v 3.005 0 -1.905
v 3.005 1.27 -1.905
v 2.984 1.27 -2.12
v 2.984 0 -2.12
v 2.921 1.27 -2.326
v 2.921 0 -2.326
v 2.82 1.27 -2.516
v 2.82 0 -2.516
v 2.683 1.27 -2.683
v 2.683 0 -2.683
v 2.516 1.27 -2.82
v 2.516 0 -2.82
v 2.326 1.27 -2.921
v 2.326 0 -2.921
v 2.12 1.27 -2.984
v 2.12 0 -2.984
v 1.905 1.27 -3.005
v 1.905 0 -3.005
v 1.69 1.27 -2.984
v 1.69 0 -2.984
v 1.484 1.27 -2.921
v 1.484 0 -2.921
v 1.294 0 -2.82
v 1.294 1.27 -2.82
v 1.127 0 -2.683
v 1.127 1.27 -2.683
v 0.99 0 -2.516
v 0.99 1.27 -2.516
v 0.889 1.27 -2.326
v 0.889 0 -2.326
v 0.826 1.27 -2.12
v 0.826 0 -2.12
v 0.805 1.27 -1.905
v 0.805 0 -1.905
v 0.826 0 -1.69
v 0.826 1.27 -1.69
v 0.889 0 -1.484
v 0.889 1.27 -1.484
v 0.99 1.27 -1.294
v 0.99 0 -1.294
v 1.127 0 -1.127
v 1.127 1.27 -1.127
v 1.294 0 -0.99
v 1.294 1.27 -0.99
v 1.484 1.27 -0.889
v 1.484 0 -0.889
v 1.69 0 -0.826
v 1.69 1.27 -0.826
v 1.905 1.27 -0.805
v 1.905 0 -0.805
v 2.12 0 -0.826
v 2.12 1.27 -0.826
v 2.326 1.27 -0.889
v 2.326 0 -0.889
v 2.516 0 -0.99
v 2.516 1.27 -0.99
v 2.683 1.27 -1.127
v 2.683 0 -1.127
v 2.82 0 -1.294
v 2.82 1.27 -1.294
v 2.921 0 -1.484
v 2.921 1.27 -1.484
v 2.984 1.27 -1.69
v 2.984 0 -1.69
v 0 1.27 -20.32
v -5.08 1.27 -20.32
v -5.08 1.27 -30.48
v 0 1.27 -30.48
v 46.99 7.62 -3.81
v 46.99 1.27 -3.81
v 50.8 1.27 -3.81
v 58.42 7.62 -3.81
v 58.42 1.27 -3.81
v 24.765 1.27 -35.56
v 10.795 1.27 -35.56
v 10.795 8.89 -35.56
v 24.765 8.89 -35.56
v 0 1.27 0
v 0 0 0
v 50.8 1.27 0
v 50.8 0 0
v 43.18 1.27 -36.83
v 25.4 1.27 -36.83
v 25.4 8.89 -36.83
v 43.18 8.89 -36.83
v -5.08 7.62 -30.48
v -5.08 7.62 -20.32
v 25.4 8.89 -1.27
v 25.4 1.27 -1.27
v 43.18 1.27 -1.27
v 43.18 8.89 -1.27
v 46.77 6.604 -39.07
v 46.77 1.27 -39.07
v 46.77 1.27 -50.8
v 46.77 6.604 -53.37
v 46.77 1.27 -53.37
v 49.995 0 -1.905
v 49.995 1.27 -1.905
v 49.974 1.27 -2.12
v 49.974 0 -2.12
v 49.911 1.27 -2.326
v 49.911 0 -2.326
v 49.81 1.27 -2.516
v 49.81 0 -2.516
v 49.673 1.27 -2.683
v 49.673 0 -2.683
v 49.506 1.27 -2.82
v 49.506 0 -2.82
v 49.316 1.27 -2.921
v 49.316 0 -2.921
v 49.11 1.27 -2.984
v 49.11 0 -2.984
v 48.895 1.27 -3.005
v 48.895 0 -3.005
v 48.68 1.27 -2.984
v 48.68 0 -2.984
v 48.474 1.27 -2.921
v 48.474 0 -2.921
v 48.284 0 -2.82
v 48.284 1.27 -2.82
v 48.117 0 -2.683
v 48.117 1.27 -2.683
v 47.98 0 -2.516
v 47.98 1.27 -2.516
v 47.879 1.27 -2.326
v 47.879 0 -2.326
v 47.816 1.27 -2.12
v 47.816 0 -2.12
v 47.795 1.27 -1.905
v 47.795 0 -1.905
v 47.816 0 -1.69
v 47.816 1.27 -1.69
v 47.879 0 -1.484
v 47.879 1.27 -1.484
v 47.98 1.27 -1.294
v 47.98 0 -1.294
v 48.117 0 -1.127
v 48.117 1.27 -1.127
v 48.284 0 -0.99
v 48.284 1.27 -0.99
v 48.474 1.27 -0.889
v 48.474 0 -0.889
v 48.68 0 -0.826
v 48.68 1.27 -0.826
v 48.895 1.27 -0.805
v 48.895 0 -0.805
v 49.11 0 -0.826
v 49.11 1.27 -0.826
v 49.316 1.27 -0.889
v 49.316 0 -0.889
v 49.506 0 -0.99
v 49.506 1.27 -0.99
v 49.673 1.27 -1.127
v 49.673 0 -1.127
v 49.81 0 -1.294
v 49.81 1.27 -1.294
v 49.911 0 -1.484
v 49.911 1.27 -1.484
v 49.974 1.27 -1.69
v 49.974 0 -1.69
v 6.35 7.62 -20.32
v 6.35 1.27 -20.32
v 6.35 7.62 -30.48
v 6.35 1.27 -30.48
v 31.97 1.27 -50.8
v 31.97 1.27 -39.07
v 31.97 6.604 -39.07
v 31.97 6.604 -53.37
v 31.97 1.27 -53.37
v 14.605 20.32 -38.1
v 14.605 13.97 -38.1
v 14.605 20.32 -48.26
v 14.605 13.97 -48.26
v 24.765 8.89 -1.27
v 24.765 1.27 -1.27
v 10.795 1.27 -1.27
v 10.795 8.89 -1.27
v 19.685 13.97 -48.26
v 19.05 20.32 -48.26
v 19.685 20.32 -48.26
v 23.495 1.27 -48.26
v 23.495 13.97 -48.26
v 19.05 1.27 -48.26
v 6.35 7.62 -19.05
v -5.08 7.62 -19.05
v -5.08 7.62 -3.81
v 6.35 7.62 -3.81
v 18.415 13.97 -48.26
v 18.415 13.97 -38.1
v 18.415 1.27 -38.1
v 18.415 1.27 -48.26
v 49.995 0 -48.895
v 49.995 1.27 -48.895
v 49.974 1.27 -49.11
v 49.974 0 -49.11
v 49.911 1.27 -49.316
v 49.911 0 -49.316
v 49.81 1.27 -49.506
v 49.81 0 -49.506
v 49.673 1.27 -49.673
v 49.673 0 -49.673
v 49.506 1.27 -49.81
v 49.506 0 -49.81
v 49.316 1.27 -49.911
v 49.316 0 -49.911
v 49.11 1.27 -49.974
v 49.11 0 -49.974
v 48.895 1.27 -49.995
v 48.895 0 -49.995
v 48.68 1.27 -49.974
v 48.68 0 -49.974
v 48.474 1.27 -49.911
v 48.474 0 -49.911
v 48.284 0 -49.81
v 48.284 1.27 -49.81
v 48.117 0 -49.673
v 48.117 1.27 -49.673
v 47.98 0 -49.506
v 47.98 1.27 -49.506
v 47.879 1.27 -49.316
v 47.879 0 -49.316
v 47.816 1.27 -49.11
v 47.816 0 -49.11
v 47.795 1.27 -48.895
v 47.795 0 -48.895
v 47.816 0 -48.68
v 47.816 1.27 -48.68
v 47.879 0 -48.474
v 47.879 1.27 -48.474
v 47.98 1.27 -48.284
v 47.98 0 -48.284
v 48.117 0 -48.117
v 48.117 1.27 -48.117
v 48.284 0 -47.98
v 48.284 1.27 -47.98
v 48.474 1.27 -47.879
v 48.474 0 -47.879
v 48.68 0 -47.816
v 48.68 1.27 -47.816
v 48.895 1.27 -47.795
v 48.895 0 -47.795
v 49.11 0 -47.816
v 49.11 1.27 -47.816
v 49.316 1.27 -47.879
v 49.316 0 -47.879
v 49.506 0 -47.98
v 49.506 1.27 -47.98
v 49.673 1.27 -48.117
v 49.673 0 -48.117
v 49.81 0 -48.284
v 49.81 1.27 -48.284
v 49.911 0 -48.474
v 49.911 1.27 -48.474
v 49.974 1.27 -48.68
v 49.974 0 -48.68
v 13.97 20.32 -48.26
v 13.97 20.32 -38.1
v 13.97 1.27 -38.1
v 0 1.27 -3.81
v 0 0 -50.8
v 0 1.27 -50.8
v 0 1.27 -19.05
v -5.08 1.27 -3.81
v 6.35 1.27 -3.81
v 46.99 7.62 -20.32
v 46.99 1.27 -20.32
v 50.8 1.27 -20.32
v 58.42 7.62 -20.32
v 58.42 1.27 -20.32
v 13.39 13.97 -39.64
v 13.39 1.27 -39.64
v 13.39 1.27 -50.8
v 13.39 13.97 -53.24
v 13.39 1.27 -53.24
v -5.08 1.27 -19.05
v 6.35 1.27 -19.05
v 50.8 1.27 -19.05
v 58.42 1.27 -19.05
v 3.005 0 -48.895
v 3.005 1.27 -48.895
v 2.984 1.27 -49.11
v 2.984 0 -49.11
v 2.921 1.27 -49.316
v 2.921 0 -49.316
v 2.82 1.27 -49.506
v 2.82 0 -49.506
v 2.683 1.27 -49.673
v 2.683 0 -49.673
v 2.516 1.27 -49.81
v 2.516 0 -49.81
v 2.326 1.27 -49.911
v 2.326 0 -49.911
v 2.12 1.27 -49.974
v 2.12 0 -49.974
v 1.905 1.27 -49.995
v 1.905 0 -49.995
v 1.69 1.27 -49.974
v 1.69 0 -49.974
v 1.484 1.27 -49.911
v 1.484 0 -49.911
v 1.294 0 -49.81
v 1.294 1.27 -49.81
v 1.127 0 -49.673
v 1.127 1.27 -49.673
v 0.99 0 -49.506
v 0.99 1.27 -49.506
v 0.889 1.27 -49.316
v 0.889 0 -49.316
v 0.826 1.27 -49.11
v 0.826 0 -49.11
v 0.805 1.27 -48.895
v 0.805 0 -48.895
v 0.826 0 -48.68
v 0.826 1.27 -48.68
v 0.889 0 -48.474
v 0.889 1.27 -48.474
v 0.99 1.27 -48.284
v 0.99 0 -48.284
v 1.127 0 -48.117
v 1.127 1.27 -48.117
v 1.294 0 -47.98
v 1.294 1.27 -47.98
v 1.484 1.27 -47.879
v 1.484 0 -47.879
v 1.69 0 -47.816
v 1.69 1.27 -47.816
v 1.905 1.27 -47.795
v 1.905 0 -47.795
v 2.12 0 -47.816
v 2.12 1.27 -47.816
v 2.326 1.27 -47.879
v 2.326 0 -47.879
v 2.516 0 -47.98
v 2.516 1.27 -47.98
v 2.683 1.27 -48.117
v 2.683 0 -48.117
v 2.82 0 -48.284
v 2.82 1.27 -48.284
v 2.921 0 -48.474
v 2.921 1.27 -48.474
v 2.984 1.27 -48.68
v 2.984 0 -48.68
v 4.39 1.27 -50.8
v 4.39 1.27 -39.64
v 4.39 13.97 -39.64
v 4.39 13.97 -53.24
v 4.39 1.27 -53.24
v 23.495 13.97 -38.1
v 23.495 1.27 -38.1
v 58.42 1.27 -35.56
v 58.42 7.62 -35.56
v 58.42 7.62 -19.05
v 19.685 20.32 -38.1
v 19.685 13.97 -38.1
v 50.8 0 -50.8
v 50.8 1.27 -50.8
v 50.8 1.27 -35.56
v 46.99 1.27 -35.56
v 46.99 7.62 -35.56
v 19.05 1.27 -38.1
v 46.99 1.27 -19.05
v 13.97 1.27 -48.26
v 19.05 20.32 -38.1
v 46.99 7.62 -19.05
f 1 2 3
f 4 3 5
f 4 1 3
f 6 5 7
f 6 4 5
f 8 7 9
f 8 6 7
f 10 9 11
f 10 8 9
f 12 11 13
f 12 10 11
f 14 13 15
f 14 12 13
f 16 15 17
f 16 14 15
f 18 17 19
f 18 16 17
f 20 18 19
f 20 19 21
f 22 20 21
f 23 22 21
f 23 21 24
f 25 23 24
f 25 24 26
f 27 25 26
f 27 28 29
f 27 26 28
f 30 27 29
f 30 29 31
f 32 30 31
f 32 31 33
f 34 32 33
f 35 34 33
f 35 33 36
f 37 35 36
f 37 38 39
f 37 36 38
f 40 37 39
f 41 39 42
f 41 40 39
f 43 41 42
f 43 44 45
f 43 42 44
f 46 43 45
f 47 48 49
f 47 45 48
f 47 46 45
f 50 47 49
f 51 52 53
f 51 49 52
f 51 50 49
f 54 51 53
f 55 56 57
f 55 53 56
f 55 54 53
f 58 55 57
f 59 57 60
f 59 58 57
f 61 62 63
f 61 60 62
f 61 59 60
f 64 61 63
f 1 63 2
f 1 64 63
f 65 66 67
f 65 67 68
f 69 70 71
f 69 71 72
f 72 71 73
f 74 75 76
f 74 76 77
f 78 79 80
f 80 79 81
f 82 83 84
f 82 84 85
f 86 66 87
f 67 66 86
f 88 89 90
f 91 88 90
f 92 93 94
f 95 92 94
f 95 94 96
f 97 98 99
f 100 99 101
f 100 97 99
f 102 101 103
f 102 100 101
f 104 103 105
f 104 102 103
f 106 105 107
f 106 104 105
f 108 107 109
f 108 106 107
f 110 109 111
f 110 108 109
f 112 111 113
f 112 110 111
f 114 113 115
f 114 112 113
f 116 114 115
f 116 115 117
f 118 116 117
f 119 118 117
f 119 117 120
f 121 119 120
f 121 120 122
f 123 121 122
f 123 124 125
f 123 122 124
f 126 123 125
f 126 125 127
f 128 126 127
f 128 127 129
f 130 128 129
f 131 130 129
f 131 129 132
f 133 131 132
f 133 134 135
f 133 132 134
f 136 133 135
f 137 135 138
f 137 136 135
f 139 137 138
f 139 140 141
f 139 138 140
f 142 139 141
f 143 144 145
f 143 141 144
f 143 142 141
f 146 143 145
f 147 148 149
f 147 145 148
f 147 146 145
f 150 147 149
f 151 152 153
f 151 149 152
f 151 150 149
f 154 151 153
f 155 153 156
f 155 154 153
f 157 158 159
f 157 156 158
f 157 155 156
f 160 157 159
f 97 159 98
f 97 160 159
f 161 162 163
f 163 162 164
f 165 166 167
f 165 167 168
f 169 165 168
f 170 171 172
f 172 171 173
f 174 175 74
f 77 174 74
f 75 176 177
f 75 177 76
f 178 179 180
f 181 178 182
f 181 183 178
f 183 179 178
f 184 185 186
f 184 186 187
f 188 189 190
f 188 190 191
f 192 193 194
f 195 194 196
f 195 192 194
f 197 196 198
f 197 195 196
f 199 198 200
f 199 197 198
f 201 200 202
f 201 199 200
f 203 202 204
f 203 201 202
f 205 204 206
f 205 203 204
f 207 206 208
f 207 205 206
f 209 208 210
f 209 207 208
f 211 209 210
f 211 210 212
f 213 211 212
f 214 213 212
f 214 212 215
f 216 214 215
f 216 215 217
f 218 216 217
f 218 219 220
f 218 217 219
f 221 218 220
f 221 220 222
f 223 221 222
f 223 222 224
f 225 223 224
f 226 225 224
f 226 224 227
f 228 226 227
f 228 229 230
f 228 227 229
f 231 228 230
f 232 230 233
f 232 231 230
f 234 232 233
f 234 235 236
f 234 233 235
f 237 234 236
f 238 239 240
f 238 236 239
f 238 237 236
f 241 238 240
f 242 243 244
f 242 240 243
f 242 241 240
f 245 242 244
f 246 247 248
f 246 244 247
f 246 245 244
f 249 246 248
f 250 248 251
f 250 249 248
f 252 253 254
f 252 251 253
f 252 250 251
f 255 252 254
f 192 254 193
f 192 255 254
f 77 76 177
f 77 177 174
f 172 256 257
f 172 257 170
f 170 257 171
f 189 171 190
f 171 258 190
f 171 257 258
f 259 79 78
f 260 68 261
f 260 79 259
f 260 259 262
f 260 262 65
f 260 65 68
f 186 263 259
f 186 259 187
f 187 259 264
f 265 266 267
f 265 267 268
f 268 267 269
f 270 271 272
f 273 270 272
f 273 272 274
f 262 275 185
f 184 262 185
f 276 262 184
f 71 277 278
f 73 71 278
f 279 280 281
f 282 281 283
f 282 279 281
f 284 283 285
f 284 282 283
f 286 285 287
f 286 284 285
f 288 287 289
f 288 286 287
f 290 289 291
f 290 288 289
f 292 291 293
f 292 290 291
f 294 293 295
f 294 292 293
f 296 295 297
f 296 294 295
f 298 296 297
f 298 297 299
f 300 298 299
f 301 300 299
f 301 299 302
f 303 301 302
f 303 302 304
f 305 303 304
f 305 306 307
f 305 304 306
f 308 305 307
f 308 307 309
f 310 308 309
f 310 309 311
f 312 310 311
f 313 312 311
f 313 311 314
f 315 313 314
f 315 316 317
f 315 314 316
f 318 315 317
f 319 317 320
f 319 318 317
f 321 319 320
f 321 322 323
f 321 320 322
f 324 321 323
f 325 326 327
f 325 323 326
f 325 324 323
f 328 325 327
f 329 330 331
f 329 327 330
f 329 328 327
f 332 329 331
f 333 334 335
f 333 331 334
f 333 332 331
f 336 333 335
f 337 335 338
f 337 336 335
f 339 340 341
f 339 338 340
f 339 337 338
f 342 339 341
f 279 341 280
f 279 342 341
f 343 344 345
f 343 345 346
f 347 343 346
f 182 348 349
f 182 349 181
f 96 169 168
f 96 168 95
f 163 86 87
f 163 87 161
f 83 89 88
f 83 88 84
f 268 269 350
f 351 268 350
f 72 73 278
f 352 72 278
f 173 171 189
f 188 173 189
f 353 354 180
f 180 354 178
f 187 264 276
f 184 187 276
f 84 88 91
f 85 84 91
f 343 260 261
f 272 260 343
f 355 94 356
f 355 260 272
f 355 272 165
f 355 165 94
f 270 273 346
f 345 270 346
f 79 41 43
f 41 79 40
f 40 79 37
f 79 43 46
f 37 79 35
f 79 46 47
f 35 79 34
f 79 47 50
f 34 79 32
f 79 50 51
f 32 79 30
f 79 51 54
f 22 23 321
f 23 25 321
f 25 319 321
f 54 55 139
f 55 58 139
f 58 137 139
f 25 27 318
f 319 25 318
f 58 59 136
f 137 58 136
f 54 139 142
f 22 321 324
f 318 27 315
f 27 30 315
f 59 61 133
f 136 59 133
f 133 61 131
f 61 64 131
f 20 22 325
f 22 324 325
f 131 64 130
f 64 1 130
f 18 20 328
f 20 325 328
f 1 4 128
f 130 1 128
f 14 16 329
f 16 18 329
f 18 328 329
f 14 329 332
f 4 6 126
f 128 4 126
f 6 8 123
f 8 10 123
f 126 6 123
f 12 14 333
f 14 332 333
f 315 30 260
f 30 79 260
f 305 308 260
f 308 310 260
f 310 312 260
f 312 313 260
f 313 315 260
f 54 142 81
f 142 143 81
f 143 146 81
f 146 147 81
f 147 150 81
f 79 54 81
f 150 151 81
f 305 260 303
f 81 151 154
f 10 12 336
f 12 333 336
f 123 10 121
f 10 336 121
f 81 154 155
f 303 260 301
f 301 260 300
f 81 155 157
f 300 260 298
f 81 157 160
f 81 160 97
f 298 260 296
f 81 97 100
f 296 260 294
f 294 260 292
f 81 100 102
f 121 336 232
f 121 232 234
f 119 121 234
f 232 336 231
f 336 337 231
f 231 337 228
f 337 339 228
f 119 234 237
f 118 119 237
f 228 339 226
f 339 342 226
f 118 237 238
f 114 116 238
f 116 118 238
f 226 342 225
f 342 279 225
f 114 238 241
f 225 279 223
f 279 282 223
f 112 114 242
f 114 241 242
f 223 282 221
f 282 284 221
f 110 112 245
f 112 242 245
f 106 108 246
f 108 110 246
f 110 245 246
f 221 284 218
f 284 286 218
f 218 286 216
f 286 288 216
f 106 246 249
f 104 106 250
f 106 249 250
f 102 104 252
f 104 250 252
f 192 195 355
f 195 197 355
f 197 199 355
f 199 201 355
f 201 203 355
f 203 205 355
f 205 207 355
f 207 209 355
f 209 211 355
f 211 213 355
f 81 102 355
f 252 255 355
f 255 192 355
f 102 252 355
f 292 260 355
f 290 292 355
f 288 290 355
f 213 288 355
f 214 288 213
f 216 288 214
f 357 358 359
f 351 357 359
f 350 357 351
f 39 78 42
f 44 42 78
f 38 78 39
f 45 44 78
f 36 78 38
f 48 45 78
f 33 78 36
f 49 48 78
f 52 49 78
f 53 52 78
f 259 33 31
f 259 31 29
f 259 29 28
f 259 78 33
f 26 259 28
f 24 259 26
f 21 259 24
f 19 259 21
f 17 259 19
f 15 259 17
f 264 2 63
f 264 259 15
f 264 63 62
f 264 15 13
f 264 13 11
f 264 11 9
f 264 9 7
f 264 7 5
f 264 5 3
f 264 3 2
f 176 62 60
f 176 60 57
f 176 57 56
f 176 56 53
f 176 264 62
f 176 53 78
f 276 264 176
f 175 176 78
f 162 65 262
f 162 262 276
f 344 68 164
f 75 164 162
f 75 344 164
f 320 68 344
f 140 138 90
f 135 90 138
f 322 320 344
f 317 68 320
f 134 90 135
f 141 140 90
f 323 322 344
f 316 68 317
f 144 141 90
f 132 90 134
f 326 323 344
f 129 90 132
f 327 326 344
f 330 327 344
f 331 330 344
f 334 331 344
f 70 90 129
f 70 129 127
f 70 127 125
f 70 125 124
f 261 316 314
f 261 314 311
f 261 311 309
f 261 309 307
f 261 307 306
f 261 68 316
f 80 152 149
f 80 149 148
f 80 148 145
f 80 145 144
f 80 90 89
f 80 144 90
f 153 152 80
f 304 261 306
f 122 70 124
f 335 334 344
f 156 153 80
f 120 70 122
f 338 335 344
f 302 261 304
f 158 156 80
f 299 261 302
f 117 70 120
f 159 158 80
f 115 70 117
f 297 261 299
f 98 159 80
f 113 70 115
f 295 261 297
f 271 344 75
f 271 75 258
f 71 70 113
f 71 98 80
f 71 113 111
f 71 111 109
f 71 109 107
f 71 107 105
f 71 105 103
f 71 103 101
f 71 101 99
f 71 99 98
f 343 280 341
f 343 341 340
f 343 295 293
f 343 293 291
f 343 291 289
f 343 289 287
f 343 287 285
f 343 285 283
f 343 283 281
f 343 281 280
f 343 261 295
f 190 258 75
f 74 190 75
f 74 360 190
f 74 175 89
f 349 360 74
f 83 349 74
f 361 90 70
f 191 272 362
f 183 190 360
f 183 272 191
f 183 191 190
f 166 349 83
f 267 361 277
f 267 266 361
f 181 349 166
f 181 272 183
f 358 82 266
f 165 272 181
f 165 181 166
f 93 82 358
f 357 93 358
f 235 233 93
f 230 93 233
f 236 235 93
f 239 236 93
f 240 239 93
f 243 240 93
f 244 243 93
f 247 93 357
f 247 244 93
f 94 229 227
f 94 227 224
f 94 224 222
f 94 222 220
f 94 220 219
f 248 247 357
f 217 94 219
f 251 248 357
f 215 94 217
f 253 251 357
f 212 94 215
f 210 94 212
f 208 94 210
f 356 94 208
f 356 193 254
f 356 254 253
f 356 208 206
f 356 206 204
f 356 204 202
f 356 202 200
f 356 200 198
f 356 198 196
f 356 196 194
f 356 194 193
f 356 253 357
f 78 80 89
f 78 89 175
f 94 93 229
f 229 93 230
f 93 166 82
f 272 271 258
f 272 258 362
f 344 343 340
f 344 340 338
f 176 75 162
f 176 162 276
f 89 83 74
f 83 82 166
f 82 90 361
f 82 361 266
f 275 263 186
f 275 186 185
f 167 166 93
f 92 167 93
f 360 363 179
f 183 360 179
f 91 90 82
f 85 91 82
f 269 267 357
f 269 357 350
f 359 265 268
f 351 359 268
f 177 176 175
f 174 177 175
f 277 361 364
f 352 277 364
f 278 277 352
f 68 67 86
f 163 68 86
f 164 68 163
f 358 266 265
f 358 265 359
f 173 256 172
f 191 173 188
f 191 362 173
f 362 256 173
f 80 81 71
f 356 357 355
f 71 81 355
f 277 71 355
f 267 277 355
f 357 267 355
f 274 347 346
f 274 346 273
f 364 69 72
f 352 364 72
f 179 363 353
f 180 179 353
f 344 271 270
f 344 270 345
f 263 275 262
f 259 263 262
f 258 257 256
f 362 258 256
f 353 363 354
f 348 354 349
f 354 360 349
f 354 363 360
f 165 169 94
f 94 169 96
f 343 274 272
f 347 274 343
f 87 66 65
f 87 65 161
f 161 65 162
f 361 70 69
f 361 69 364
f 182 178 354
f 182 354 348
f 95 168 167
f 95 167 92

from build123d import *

# Parameters (mm, degrees)
SKETCH3_W           = 50.8
SKETCH3_H           = 50.8
BOSS_EXTRUDE1_DEPTH = 1.27
CUT_EXTRUDE1_REACH  = 3.27
SKETCH4_R           = 1.0999978
SKETCH5_W           = 17.78
SKETCH5_H           = 35.56
SKETCH5_W_2         = 13.97
SKETCH5_H_2         = 34.29
BOSS_EXTRUDE2_DEPTH = 7.62
SKETCH6_W           = 14.8000212
SKETCH6_H           = 14.2999968
BOSS_EXTRUDE3_DEPTH = 5.334
BOSS_EXTRUDE4_DEPTH = 12.7
SKETCH8_W           = 11.43
SKETCH8_H           = 15.24
SKETCH8_H_2         = 10.16
BOSS_EXTRUDE5_DEPTH = 6.35
SKETCH9_W           = 3.81
SKETCH9_H           = 10.16
BOSS_EXTRUDE6_DEPTH = 12.7
SKETCH10_W          = 0.635
SKETCH10_H          = 10.16
BOSS_EXTRUDE7_DEPTH = 19.05


with BuildPart() as part:
    # Sketch3 → Boss-Extrude1 (new body)
    with BuildSketch(Plane(origin=(0, 0, 0), x_dir=(1, 0, 0), z_dir=(0, 1, 0))):
        with Locations((25.4, 25.4)):
            Rectangle(SKETCH3_W, SKETCH3_H)
    extrude(amount=BOSS_EXTRUDE1_DEPTH)

    # Sketch4 → Cut-Extrude1 (cut, up to next)
    with BuildSketch(Plane(origin=(0, 0, 0), x_dir=(1, 0, 0), z_dir=(0, 1, 0)), mode=Mode.PRIVATE) as cut_extrude1_sk1:
        with Locations((1.905, 48.895)):
            Circle(SKETCH4_R)
    cut_extrude1_tool1 = extrude(cut_extrude1_sk1.sketch, amount=CUT_EXTRUDE1_REACH, mode=Mode.PRIVATE) & part.part
    add(cut_extrude1_tool1.solids().sort_by_distance((1.905, 0, -48.895))[0], mode=Mode.SUBTRACT)
    # Sketch4 → Cut-Extrude1 (cut, up to next)
    with BuildSketch(Plane(origin=(0, 0, 0), x_dir=(1, 0, 0), z_dir=(0, 1, 0)), mode=Mode.PRIVATE) as cut_extrude1_sk2:
        with Locations((48.895, 48.895)):
            Circle(SKETCH4_R)
    cut_extrude1_tool2 = extrude(cut_extrude1_sk2.sketch, amount=CUT_EXTRUDE1_REACH, mode=Mode.PRIVATE) & part.part
    add(cut_extrude1_tool2.solids().sort_by_distance((48.895, 0, -48.895))[0], mode=Mode.SUBTRACT)
    # Sketch4 → Cut-Extrude1 (cut, up to next)
    with BuildSketch(Plane(origin=(0, 0, 0), x_dir=(1, 0, 0), z_dir=(0, 1, 0)), mode=Mode.PRIVATE) as cut_extrude1_sk3:
        with Locations((48.895, 1.905)):
            Circle(SKETCH4_R)
    cut_extrude1_tool3 = extrude(cut_extrude1_sk3.sketch, amount=CUT_EXTRUDE1_REACH, mode=Mode.PRIVATE) & part.part
    add(cut_extrude1_tool3.solids().sort_by_distance((48.895, 0, -1.905))[0], mode=Mode.SUBTRACT)
    # Sketch4 → Cut-Extrude1 (cut, up to next)
    with BuildSketch(Plane(origin=(0, 0, 0), x_dir=(1, 0, 0), z_dir=(0, 1, 0)), mode=Mode.PRIVATE) as cut_extrude1_sk4:
        with Locations((1.905, 1.905)):
            Circle(SKETCH4_R)
    cut_extrude1_tool4 = extrude(cut_extrude1_sk4.sketch, amount=CUT_EXTRUDE1_REACH, mode=Mode.PRIVATE) & part.part
    add(cut_extrude1_tool4.solids().sort_by_distance((1.905, 0, -1.905))[0], mode=Mode.SUBTRACT)

    # Sketch5 → Boss-Extrude2 (add)
    with BuildSketch(Plane(origin=(0, 1.27, 0), x_dir=(1, 0, 0), z_dir=(0, 1, 0))):
        with Locations((34.29, 19.05)):
            Rectangle(SKETCH5_W, SKETCH5_H)
        with Locations((17.78, 18.415)):
            Rectangle(SKETCH5_W_2, SKETCH5_H_2)
    extrude(amount=BOSS_EXTRUDE2_DEPTH)

    # Sketch6 → Boss-Extrude3 (add)
    with BuildSketch(Plane(origin=(0, 1.27, 0), x_dir=(1, 0, 0), z_dir=(0, 1, 0))):
        with Locations((39.37, 46.219999)):
            Rectangle(SKETCH6_W, SKETCH6_H)
    extrude(amount=BOSS_EXTRUDE3_DEPTH)

    # Sketch7 → Boss-Extrude4 (add)
    with BuildSketch(Plane(origin=(0, 1.27, 0), x_dir=(1, 0, 0), z_dir=(0, 1, 0))):
        Polygon((4.390009, 53.2400002), (13.389991, 53.2400002), (13.389991, 50.340006), (13.389991, 39.640002), (4.390009, 39.640002), align=None)
    extrude(amount=BOSS_EXTRUDE4_DEPTH)

    # Sketch8 → Boss-Extrude5 (add)
    with BuildSketch(Plane(origin=(0, 1.27, 0), x_dir=(1, 0, 0), z_dir=(0, 1, 0))):
        with Locations((0.635, 11.43)):
            Rectangle(SKETCH8_W, SKETCH8_H)
        with Locations((0.635, 25.4)):
            Rectangle(SKETCH8_W, SKETCH8_H_2)
        with Locations((52.705, 27.94)):
            Rectangle(SKETCH8_W, SKETCH8_H)
        with Locations((52.705, 11.43)):
            Rectangle(SKETCH8_W, SKETCH8_H)
    extrude(amount=BOSS_EXTRUDE5_DEPTH)

    # Sketch9 → Boss-Extrude6 (add)
    with BuildSketch(Plane(origin=(0, 1.27, 0), x_dir=(1, 0, 0), z_dir=(0, 1, 0))):
        with Locations((21.59, 43.18)):
            Rectangle(SKETCH9_W, SKETCH9_H)
        with Locations((16.51, 43.18)):
            Rectangle(SKETCH9_W, SKETCH9_H)
    extrude(amount=BOSS_EXTRUDE6_DEPTH)

    # Sketch10 → Boss-Extrude7 (add)
    with BuildSketch(Plane(origin=(0, 1.27, 0), x_dir=(1, 0, 0), z_dir=(0, 1, 0))):
        with Locations((19.3675, 43.18)):
            Rectangle(SKETCH10_W, SKETCH10_H)
        with Locations((14.2875, 43.18)):
            Rectangle(SKETCH10_W, SKETCH10_H)
    extrude(amount=BOSS_EXTRUDE7_DEPTH)


solid = part.part
